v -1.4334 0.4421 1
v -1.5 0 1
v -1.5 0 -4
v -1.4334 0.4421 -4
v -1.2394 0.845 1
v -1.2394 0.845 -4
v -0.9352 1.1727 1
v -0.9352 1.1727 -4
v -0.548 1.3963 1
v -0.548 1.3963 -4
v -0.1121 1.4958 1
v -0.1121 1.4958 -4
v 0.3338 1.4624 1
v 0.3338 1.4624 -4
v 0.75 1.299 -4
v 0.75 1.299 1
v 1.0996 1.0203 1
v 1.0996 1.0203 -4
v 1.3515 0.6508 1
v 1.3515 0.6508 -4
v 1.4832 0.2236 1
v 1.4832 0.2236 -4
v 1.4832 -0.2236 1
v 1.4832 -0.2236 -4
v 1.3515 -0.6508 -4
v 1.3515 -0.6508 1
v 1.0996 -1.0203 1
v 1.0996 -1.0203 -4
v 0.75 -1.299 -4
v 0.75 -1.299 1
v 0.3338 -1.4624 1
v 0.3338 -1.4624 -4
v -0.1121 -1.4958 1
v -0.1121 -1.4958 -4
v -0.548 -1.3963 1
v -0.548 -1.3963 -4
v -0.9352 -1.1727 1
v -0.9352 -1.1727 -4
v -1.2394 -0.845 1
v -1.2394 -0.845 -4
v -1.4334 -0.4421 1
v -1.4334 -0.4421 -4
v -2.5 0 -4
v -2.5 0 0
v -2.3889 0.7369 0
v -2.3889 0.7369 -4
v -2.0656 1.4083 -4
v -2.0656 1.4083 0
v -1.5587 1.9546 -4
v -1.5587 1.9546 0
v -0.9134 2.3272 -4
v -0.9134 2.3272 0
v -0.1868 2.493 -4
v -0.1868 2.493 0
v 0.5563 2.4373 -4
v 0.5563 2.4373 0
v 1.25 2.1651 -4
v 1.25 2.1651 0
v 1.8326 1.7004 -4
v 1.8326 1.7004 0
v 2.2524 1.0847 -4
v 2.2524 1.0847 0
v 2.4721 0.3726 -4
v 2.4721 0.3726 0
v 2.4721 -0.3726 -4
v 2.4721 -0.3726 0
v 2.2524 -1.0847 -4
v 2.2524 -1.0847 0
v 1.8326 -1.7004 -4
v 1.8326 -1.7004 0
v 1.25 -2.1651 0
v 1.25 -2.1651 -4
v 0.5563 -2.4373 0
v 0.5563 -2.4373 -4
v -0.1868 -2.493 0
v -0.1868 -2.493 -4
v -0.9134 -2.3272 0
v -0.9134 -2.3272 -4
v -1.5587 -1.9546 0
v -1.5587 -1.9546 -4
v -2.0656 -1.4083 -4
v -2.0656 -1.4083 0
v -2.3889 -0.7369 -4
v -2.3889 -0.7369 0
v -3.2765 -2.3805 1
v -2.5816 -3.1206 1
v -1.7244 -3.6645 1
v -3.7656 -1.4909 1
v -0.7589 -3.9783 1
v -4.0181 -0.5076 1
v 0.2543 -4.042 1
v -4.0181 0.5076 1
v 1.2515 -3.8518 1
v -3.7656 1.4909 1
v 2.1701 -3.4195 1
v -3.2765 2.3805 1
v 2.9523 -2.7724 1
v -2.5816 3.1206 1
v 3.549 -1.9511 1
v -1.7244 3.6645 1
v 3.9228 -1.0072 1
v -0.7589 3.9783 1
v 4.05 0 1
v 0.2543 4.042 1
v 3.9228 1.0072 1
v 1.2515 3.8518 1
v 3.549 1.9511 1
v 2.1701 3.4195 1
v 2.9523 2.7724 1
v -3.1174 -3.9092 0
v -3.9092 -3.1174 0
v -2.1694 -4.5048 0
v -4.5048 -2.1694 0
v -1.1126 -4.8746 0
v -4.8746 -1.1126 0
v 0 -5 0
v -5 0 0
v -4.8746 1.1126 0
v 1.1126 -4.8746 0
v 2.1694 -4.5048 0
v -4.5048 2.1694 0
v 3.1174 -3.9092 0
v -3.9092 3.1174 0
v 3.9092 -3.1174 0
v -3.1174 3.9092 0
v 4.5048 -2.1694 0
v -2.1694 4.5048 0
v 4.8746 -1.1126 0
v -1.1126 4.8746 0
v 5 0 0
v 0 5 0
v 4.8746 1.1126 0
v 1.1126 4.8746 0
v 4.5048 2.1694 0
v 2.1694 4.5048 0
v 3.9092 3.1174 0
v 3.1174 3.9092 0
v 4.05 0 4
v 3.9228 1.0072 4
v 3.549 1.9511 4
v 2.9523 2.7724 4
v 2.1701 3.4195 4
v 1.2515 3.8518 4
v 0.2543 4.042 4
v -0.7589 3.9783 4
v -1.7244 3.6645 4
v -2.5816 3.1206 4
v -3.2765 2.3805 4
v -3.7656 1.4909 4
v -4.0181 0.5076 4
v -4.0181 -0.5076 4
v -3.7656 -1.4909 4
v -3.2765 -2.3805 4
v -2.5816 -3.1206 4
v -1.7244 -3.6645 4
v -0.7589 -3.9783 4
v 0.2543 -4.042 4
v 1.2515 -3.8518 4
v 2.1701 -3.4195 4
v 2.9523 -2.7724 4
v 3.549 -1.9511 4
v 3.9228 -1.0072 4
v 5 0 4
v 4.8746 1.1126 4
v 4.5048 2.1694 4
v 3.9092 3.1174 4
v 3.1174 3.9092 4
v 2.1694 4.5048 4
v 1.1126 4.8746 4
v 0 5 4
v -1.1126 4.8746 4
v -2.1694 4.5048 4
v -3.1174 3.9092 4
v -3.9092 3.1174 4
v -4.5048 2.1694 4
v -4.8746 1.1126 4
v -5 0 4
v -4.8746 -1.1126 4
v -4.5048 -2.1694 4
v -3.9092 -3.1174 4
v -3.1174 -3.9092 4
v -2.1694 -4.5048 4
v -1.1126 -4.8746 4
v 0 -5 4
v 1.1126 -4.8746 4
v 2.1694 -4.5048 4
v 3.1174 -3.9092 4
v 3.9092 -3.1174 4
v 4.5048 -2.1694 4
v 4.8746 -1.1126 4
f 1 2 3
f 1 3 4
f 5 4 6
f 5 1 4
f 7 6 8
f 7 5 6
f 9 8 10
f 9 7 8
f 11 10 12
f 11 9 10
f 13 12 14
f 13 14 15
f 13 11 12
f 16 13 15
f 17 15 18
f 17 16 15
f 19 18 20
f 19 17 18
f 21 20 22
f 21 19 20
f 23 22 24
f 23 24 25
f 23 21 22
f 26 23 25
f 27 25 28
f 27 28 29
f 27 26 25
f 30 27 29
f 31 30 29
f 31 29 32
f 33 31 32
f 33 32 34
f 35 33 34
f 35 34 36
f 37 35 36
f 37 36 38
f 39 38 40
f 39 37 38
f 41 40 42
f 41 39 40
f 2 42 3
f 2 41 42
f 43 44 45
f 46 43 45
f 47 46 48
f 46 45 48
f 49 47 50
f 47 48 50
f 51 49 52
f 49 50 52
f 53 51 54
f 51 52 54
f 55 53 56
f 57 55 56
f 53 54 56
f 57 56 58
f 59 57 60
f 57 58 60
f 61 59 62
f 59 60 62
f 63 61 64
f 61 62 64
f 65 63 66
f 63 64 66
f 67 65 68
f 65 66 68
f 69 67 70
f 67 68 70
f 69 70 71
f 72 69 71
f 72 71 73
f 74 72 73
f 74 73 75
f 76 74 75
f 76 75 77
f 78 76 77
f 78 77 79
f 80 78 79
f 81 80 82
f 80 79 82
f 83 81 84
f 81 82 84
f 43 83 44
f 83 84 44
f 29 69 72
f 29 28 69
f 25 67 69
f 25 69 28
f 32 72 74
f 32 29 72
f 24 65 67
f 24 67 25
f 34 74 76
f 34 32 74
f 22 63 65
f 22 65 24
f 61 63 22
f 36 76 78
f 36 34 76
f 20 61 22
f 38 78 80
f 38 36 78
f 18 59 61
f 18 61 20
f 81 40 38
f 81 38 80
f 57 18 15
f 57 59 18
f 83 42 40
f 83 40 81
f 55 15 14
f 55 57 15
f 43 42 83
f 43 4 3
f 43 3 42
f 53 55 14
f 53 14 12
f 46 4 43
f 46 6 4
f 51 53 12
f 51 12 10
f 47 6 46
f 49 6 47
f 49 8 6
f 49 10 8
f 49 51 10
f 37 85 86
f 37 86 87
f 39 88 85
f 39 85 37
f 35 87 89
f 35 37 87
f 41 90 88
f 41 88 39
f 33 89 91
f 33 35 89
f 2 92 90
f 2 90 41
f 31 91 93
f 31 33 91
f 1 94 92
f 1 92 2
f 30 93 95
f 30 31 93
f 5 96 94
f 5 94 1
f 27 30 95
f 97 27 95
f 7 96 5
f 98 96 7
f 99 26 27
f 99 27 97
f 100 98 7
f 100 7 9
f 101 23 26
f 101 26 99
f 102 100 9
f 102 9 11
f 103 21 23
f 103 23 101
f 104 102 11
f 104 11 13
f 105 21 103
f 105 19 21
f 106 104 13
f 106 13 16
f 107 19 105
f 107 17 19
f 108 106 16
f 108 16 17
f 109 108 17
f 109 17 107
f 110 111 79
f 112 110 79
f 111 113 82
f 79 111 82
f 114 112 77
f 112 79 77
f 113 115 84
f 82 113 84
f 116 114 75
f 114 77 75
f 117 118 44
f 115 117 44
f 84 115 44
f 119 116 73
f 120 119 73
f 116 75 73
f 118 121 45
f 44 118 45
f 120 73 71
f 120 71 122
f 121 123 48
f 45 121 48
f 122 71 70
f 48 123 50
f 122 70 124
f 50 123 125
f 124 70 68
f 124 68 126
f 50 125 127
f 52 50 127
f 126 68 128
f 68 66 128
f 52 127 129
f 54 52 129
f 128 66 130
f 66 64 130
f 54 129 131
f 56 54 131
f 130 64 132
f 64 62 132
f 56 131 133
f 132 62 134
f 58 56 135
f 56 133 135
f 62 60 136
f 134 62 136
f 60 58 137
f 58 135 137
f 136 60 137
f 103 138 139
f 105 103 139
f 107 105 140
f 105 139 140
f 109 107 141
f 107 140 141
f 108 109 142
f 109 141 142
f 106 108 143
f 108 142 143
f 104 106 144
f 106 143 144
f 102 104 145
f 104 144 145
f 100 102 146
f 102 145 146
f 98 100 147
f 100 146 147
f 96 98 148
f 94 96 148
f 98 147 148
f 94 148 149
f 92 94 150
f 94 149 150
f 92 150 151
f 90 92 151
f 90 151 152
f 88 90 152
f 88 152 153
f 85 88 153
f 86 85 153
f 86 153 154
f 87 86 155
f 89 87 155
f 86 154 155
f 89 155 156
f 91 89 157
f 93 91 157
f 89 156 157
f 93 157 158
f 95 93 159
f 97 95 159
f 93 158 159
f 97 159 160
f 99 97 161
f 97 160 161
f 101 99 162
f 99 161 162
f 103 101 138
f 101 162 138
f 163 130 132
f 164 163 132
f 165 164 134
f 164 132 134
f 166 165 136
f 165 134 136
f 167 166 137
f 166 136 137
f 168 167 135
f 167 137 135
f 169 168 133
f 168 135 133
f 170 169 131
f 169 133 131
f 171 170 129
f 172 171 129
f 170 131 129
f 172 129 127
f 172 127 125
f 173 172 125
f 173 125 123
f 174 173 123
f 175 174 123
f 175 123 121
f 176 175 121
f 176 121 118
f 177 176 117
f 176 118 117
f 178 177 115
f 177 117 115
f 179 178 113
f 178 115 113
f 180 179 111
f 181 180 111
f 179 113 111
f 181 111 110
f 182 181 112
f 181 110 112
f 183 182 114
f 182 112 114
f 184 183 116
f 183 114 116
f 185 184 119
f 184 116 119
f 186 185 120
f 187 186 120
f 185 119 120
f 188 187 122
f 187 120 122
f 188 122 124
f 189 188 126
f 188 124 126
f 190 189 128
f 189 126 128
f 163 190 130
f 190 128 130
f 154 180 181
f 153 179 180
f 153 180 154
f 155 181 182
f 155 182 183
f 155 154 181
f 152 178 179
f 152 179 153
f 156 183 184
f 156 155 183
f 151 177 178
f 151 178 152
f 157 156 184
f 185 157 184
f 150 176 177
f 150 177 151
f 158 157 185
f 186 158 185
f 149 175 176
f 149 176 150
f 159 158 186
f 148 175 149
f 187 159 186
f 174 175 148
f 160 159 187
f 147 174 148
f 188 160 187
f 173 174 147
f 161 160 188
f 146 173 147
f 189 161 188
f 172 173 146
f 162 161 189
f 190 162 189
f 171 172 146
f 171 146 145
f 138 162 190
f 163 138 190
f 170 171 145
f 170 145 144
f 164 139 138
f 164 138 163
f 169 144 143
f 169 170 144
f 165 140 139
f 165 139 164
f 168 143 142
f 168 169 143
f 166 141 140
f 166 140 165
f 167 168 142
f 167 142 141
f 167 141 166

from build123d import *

# Parameters (mm, degrees)
SKETCH_1_R               = 5
EXTRUDE_1_DEPTH          = 4
SKETCH_4_R               = 2.5
EXTRUDE_2_DEPTH          = 4
SKETCH_2_R               = 1.5
CUT_EXTRUDE_1_DEPTH      = 4
CUT_EXTRUDE_1_DEPTH_BACK = 3
SKETCH_3_R               = 4.05
CUT_EXTRUDE_2_DEPTH      = 3


with BuildPart() as part:
    # 草图1 → 凸台-拉伸1 (new body)
    with BuildSketch(Plane.XY):
        Circle(SKETCH_1_R)
    extrude(amount=EXTRUDE_1_DEPTH)

    # 草图4 → 凸台-拉伸2 (add)
    with BuildSketch(Plane(origin=(0, 0, 0), x_dir=(-1, 0, 0), z_dir=(0, 0, -1))):
        Circle(SKETCH_4_R)
    extrude(amount=EXTRUDE_2_DEPTH)

    # 草图2 → 切除-拉伸1 (cut, two sides)
    with BuildSketch(Plane(origin=(0, 0, 0), x_dir=(-1, 0, 0), z_dir=(0, 0, -1))) as cut_extrude_1_sk:
        Circle(SKETCH_2_R)
    extrude(amount=CUT_EXTRUDE_1_DEPTH, mode=Mode.SUBTRACT)
    extrude(cut_extrude_1_sk.sketch, amount=-CUT_EXTRUDE_1_DEPTH_BACK, mode=Mode.SUBTRACT)

    # 草图3 → 切除-拉伸2 (cut)
    with BuildSketch(Plane.XY.offset(4)):
        Circle(SKETCH_3_R)
    extrude(amount=-CUT_EXTRUDE_2_DEPTH, mode=Mode.SUBTRACT)


solid = part.part
